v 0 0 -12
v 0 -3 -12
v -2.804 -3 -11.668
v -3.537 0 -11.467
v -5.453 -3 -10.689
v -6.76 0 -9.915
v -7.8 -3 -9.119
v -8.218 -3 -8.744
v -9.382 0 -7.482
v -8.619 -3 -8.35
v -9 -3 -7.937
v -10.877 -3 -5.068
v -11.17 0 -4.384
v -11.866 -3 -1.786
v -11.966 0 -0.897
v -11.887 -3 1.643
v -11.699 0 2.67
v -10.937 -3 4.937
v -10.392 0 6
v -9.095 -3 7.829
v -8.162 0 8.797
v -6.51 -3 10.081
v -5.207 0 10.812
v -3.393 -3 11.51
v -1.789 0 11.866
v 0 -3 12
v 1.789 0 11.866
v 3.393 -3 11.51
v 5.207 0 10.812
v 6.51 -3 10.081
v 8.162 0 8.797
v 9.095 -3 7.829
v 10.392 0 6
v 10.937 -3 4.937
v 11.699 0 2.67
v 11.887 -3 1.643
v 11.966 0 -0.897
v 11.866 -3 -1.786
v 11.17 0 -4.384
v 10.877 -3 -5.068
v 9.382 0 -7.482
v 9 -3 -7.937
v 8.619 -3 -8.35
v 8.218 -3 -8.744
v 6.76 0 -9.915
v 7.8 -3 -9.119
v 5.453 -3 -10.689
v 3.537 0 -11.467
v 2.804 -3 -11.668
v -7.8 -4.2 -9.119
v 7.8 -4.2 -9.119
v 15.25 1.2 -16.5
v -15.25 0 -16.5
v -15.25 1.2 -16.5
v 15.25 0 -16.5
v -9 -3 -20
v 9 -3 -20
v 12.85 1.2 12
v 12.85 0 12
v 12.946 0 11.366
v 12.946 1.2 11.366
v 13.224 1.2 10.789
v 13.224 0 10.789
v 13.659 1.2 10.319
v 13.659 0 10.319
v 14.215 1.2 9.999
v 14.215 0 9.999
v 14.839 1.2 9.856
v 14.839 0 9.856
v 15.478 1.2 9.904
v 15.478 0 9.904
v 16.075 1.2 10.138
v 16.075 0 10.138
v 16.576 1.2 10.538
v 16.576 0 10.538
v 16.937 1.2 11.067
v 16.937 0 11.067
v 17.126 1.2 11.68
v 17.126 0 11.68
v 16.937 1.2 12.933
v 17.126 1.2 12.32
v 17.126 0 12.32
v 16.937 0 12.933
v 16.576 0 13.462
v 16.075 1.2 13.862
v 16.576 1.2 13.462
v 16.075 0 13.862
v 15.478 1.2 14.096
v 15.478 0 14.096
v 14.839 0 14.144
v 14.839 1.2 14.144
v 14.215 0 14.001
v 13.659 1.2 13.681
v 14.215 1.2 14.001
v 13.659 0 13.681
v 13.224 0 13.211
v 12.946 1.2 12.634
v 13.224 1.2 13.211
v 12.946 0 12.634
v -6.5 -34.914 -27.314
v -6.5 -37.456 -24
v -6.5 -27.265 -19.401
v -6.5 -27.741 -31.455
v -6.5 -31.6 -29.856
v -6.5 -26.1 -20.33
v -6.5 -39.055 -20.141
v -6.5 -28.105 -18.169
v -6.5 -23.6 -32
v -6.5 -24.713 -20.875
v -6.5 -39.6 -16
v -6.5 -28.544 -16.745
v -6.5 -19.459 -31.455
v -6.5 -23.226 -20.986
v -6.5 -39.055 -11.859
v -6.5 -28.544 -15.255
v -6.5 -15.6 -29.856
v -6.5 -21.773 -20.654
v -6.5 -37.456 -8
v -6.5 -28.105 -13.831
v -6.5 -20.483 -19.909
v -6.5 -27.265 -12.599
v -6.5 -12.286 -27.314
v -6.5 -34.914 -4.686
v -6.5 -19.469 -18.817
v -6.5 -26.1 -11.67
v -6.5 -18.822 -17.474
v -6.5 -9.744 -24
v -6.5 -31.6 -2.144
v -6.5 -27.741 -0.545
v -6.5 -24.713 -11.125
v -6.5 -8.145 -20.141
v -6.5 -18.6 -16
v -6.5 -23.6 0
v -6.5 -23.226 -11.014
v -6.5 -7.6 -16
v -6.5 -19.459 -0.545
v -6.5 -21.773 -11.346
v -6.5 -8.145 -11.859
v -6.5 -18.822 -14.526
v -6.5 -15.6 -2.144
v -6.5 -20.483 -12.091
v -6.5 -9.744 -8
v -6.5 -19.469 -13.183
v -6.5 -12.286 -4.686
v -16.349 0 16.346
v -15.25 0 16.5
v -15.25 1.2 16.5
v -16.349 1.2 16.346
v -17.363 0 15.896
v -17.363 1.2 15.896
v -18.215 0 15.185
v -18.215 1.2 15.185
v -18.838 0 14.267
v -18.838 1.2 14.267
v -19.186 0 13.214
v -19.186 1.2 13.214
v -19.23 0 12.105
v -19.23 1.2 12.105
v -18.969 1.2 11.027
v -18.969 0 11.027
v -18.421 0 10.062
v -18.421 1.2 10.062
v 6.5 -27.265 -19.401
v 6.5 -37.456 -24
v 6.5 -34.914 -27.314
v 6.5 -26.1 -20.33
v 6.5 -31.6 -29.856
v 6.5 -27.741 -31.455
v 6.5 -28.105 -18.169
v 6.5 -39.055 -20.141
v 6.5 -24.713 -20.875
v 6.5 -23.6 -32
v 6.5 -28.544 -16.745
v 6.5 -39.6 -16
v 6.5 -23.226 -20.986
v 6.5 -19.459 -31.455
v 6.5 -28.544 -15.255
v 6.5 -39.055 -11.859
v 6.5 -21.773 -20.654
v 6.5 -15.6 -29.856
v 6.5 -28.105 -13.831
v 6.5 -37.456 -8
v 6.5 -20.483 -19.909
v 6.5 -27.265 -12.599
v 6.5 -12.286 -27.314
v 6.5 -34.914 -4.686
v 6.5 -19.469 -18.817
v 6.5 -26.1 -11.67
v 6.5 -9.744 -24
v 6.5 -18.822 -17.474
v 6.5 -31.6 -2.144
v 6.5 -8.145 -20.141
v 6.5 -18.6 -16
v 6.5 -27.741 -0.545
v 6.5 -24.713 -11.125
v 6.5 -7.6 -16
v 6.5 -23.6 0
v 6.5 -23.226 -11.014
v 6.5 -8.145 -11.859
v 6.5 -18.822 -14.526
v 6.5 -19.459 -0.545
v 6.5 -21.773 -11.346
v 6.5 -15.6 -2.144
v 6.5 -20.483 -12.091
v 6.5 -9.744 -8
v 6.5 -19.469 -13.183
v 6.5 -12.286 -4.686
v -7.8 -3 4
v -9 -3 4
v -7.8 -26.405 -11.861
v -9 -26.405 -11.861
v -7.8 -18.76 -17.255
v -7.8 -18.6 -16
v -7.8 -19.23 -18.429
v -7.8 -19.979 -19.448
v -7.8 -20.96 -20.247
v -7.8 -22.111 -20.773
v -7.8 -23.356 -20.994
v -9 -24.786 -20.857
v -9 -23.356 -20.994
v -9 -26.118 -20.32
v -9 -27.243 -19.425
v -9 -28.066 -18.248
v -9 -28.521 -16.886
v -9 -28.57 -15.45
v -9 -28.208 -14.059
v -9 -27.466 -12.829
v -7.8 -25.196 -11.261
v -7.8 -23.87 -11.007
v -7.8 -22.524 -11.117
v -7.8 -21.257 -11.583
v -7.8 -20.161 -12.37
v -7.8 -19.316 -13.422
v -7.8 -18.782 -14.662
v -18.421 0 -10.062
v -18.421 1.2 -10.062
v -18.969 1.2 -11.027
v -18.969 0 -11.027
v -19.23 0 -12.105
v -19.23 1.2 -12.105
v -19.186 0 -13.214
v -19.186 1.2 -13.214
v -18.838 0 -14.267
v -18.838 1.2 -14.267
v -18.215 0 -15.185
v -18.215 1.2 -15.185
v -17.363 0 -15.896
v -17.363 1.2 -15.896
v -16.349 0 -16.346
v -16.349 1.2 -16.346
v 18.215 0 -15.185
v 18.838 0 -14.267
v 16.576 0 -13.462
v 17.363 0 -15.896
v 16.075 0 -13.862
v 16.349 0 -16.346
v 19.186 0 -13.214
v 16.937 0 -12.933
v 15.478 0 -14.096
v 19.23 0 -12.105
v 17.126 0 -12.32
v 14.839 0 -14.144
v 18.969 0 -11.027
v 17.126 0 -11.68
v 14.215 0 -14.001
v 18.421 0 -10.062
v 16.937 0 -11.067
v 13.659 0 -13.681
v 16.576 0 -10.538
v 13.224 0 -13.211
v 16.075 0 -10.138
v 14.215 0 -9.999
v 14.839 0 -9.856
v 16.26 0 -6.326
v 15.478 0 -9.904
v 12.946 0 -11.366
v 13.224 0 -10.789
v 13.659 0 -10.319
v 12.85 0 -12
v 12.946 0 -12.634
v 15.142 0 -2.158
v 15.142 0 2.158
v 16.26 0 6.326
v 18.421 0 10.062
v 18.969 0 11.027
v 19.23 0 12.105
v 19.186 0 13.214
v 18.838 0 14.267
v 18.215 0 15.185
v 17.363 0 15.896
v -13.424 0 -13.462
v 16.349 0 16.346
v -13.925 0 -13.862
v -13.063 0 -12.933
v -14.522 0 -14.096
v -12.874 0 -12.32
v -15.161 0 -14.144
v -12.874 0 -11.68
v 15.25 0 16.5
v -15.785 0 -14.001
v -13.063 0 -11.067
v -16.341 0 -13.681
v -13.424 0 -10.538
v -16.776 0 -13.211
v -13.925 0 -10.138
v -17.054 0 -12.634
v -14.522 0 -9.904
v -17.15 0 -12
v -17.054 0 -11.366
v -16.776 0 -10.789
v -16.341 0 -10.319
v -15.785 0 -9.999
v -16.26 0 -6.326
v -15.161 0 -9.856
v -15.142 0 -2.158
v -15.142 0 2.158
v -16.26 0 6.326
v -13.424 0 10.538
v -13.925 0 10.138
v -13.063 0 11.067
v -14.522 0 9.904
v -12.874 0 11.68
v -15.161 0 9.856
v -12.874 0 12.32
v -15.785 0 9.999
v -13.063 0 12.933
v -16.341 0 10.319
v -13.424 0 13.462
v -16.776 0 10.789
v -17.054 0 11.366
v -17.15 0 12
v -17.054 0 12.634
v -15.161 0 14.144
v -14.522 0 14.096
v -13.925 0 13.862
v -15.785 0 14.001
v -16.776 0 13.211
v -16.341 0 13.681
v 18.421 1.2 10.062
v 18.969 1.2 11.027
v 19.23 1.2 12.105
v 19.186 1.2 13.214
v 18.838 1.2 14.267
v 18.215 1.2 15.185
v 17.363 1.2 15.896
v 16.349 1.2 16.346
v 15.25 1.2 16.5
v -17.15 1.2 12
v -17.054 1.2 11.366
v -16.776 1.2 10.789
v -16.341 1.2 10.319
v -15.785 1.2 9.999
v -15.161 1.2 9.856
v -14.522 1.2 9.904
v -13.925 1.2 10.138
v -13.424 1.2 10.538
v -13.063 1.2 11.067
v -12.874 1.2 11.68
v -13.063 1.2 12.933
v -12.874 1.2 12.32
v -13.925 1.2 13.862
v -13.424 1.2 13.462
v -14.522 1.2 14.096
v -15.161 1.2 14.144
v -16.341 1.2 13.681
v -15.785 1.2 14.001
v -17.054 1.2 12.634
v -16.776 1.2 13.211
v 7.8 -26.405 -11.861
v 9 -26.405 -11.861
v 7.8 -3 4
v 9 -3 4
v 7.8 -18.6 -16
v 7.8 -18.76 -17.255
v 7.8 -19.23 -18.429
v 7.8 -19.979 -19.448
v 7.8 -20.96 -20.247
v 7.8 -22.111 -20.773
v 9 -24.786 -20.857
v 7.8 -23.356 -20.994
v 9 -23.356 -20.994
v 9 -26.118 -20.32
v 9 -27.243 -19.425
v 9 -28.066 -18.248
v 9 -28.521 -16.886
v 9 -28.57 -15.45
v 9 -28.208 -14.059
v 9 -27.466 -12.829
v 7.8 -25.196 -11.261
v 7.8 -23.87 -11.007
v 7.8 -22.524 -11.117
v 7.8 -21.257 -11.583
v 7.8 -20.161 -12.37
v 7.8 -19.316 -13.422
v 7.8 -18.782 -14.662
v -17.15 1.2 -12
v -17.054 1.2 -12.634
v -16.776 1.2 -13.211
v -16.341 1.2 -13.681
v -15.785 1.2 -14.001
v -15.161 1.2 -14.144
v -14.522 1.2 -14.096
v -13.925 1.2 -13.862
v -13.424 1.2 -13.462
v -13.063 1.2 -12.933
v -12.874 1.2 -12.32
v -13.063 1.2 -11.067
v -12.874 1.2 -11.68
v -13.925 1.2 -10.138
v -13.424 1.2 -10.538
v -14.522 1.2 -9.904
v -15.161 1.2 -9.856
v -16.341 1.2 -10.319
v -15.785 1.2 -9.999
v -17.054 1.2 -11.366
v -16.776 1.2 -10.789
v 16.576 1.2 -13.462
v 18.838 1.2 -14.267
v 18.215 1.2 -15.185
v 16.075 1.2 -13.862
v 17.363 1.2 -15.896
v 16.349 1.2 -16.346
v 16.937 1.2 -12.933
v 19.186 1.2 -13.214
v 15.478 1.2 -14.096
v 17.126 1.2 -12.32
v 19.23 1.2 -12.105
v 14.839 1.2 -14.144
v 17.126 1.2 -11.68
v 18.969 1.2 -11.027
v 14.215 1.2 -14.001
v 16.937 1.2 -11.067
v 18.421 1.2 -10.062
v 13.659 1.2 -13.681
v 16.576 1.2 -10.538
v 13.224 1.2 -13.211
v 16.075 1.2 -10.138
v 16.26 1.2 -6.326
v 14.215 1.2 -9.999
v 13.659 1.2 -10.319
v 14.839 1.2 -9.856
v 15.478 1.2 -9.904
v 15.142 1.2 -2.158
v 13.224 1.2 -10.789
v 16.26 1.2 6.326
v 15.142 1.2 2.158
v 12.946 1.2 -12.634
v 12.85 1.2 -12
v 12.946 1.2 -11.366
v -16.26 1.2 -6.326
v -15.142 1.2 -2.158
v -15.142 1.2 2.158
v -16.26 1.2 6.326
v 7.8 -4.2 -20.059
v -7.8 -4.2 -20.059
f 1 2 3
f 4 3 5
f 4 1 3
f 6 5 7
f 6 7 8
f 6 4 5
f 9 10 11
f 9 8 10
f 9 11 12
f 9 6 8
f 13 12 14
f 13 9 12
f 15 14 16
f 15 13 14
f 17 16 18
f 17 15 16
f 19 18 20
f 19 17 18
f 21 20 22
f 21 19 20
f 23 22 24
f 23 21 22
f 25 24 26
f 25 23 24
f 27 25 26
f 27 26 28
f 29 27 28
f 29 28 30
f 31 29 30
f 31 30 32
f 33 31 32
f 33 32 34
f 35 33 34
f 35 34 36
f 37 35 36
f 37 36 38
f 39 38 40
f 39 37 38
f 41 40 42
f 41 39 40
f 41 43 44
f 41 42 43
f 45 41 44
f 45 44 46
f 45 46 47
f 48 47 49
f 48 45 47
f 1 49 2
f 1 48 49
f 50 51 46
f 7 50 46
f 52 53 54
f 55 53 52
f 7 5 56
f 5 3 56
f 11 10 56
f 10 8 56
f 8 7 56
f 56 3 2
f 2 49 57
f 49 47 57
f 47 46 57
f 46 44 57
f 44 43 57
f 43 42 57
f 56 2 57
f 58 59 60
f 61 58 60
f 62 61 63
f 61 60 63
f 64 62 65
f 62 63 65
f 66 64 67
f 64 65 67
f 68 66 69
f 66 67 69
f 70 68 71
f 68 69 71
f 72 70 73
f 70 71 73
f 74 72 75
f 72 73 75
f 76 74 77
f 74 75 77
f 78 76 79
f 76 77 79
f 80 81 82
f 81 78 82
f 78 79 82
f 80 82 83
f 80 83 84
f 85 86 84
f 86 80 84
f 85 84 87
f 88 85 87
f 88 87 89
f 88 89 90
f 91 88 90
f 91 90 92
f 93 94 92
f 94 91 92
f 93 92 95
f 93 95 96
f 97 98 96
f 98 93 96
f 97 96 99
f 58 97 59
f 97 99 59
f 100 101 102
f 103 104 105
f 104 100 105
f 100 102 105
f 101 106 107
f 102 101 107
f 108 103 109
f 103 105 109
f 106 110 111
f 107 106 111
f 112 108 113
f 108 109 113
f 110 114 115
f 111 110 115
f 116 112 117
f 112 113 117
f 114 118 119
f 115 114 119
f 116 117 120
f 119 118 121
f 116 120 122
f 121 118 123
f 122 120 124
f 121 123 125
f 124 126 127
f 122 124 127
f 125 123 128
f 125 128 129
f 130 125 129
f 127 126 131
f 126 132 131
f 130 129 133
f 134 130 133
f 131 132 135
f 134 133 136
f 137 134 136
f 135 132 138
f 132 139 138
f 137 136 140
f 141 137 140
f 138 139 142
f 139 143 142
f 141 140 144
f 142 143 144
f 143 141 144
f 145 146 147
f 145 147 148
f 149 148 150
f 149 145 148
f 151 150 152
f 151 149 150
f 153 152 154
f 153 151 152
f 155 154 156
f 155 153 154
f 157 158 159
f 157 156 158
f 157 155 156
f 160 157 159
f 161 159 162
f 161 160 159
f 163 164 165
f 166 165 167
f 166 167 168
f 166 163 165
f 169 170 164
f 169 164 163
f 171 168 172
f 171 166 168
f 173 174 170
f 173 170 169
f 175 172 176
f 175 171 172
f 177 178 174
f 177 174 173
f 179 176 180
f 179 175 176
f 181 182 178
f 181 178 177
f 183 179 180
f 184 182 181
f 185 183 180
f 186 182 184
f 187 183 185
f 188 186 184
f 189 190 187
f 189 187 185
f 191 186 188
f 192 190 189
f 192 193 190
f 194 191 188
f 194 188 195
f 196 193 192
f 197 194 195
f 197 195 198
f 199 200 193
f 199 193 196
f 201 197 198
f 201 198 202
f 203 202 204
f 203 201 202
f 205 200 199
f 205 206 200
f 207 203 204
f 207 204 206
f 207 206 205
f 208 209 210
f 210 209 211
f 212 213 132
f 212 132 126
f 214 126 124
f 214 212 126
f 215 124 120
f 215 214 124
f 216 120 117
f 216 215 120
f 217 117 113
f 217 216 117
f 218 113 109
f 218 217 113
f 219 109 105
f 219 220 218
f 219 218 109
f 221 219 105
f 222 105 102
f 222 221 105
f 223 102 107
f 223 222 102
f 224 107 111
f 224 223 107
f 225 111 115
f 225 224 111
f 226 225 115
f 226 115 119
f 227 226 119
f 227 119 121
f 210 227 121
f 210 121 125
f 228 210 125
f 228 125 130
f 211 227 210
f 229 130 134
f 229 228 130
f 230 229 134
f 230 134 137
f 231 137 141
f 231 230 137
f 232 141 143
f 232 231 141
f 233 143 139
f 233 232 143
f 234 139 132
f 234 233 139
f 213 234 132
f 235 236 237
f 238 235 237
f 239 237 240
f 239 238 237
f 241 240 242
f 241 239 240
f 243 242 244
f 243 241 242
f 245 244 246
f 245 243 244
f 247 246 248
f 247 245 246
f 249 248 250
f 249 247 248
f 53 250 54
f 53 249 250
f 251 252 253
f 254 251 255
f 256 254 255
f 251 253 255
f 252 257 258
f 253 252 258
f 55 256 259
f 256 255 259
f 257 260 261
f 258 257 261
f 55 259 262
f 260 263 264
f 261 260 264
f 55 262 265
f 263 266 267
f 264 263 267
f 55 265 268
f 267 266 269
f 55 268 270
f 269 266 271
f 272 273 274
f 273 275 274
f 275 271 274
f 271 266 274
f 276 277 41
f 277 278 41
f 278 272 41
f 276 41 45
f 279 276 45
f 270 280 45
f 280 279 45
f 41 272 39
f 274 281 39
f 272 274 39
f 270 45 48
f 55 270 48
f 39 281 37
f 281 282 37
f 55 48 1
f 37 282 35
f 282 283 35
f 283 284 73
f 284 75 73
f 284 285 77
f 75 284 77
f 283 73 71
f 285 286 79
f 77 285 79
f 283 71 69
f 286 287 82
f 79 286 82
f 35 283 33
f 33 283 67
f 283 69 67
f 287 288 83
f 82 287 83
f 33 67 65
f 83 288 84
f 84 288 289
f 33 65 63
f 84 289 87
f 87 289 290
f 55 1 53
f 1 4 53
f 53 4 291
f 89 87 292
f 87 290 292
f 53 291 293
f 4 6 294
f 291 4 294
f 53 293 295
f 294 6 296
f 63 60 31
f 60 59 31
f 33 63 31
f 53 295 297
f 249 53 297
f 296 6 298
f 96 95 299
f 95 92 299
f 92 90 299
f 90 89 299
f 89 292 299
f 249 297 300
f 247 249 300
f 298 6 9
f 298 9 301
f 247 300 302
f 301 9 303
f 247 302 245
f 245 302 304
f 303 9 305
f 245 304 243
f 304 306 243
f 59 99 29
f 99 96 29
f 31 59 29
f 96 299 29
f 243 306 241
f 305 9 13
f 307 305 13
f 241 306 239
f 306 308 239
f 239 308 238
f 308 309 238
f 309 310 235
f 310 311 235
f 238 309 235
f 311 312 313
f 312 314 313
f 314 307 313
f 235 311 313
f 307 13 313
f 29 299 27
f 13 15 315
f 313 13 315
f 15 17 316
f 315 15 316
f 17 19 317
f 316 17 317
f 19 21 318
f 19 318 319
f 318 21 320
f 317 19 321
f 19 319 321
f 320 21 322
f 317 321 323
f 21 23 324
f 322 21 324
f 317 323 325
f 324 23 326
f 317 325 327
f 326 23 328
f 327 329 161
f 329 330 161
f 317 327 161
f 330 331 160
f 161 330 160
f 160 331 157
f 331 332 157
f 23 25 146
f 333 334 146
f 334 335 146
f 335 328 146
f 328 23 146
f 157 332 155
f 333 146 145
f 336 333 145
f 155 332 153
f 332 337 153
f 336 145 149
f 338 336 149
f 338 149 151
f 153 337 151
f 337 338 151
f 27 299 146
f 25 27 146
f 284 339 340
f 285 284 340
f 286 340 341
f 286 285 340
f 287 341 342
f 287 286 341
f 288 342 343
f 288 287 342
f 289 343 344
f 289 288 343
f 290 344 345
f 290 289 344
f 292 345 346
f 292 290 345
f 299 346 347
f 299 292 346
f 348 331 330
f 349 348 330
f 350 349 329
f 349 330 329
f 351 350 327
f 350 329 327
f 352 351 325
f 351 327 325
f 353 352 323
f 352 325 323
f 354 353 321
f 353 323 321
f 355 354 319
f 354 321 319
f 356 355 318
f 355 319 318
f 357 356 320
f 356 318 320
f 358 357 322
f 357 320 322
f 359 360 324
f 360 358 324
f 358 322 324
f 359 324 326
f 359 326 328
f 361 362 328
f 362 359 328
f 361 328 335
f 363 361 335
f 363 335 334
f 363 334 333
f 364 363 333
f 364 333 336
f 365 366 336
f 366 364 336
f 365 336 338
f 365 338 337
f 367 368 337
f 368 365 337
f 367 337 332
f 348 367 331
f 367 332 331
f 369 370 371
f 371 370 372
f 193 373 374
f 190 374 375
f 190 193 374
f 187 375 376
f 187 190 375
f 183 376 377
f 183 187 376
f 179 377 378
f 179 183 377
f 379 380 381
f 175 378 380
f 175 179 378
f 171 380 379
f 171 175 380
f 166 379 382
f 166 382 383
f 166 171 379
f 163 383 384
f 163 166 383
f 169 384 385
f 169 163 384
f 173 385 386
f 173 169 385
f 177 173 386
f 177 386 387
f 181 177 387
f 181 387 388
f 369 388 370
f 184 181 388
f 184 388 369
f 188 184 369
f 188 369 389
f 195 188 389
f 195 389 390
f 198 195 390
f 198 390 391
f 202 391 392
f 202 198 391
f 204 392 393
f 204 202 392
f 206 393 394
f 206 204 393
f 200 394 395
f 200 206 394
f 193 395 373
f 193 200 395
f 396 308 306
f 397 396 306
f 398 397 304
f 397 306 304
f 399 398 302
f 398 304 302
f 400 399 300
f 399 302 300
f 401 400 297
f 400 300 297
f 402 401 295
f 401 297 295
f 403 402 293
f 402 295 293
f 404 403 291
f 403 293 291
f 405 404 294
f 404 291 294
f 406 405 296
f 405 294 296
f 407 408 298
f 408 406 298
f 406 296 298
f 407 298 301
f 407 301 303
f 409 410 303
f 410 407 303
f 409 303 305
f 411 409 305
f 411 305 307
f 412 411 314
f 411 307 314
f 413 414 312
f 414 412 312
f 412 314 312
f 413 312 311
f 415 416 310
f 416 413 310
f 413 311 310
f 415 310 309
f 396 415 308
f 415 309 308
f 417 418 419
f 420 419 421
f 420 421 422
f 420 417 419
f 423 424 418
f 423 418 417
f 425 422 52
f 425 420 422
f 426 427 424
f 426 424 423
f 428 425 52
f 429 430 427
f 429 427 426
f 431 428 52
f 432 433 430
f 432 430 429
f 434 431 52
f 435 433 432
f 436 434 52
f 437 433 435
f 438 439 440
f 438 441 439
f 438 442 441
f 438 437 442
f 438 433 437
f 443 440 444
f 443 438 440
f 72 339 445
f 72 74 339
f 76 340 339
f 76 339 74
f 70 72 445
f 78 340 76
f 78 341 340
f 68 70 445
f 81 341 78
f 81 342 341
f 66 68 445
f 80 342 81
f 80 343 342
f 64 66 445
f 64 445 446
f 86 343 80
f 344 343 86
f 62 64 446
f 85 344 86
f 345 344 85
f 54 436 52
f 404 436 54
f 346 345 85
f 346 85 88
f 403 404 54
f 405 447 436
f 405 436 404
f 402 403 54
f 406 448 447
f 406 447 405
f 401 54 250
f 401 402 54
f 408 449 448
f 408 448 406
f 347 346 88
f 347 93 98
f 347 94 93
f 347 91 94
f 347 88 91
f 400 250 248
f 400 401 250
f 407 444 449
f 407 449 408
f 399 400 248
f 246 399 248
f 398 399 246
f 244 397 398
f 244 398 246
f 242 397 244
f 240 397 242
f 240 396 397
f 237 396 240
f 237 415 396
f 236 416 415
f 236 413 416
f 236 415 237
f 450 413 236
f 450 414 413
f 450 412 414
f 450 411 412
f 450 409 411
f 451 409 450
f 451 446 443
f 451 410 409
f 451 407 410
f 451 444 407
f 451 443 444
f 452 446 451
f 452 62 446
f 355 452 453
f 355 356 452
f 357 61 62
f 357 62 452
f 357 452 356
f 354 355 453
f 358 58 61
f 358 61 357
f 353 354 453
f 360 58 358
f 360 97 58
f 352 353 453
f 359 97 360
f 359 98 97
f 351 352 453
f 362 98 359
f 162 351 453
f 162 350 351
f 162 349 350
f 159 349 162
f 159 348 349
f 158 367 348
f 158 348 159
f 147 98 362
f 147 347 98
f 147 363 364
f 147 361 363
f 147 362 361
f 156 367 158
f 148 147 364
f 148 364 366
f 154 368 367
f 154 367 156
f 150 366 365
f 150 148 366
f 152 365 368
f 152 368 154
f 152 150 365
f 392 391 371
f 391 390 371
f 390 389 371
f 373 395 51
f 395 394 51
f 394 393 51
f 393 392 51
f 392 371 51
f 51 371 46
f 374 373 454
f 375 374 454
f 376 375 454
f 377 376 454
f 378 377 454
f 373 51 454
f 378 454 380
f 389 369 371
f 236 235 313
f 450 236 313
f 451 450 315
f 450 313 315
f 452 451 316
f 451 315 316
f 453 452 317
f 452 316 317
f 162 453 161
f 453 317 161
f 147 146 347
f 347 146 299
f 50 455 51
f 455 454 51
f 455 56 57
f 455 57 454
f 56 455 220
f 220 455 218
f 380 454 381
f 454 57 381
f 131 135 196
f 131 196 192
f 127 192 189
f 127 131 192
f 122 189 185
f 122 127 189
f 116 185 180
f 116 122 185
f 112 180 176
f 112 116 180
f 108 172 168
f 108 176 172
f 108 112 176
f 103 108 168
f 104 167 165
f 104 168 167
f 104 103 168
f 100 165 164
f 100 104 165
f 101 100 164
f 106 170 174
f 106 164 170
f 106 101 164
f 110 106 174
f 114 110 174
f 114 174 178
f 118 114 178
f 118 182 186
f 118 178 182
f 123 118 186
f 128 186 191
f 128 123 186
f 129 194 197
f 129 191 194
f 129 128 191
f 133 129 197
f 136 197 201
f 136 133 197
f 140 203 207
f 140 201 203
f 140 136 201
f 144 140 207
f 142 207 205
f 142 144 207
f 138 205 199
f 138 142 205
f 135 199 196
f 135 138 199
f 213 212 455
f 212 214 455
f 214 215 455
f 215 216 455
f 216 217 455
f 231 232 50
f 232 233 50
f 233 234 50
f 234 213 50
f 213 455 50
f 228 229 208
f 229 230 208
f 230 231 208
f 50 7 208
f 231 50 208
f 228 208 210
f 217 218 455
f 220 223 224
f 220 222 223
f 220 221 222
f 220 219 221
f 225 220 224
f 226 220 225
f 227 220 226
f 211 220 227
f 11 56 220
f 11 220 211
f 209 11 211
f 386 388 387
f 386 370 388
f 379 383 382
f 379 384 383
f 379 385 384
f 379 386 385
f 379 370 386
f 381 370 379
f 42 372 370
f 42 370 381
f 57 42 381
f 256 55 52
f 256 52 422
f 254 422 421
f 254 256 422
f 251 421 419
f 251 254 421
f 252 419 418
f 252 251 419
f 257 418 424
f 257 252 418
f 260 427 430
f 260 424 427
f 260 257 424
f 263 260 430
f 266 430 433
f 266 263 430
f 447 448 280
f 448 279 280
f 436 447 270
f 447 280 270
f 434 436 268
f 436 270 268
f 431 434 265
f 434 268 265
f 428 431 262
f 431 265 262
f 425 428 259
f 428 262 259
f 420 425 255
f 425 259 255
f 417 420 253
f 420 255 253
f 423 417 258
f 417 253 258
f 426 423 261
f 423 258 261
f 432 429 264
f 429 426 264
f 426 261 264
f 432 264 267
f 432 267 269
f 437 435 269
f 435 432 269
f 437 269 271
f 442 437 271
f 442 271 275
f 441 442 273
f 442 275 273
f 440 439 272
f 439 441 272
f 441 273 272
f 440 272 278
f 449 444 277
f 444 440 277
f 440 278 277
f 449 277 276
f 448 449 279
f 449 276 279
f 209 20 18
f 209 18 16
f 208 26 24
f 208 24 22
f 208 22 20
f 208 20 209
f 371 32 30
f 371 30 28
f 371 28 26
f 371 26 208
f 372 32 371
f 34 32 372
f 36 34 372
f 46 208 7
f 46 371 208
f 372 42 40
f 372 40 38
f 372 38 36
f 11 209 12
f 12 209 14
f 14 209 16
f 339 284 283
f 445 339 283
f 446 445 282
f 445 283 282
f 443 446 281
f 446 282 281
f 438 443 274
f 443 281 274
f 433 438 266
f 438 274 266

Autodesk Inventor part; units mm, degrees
ref_plane "YZ Plane" through (0, 0, 0) normal (1, 0, 0) x (0, 1, 0)
ref_plane "XZ Plane" through (0, 0, 0) normal (0, 1, 0) x (-1, 0, 0)
ref_plane "XY Plane" through (0, 0, 0) normal (0, 0, 1) x (1, 0, 0)
sketch "Skizze1" plane through (0, 0, 0) normal (0, 1, 0) x (-1, 0, 0)
  line L0 (15.25, -16.5) -> (-15.25, -16.5)
  line L1 (15.25, 16.5) -> (-15.25, 16.5)
  arc A0 (-18.421, -10.0619) -> (-18.421, 10.0619) centre (-31.5074, 0) ccw
  arc A1 (18.421, 10.0619) -> (18.421, -10.0619) centre (31.5074, 0) ccw
  arc A2 (15.25, -16.5) -> (18.421, -10.0619) centre (15.25, -12.5) ccw
  arc A3 (18.421, 10.0619) -> (15.25, 16.5) centre (15.25, 12.5) ccw
  arc A4 (-15.25, 16.5) -> (-18.421, 10.0619) centre (-15.25, 12.5) ccw
  arc A5 (-18.421, -10.0619) -> (-15.25, -16.5) centre (-15.25, -12.5) ccw
  circle A6 centre (15, -12) radius 2.15
  circle A7 centre (-15, -12) radius 2.15
  circle A8 centre (-15, 12) radius 2.15
  circle A9 centre (15, 12) radius 2.15
  line L2 (15, 12) -> (15, -12) construction
  line L3 (15, -12) -> (-15, -12) construction
  line L4 (-15, -12) -> (-15, 12) construction
  line L5 (-15, 12) -> (15, 12) construction
  line L6 (0, -24.4811) -> (0, 24.4811) projected
  line L7 (44.8, 0) -> (-44.8, 0) projected
  line L8 (15, 0) -> (-15, 0) construction
  point P0 (0, 0)
  point P1 (32, -16.5)
  point P2 (-32, -16.5)
  point P3 (32, 16.5)
  point P4 (-32, 16.5)
  dimension "d0" = 4
  dimension "d1" = 30
  dimension "d2" = 24
  dimension "d3" = 33
  dimension "d4" = 4.3
  dimension "d5" = 38.5
extrude "Extrusion1" add sketch "Skizze1" along normal blind 1.2
sketch "Skizze2" plane through (0, 0, 0) normal (1, 0, 0) x (0, 1, 0)
  line L0 (0, 10.0619) -> (0, -10.0619) projected
  line L1 (0, 12) -> (-3, 12)
  line L2 (-3, 12) -> (-3, -12)
  line L3 (-3, -12) -> (0, -12)
  line L4 (-1.683, 0) -> (1.6805, 0) projected
  circle A0 centre (-23.6, -16) radius 16
  line L5 (1.2, 10.0619) -> (1.2, -10.0619) projected
  line L6 (0, -16.5) -> (1.2, -16.5) projected
  circle A1 centre (-23.6, -16) radius 5
  line L7 (-3, -12) -> (-3, -20)
  line L8 (-3, -20) -> (-23.3561, -20.994)
  line L9 (-3, 4) -> (-26.405, -11.8609)
  line L10 (0, 0) -> (-3, 0)
  line L11 (0, 10.0619) -> (0, -10.0619) projected
  line L12 (0, 0) -> (0, -12)
  dimension "d8" = 3
  dimension "d9" = 32
  dimension "d10" = 40.8
  dimension "d12" = 0
  dimension "d13" = 10
  dimension "d14" = 8
  dimension "d16" = 8
  dimension "d18" = 24
revolve "Umdrehung1" add sketch "Skizze2" angle 360 about axis through (0, 0, 0) along (0, -1, 0) contours L0 L12 L3 L2 L10 L4
extrude "Extrusion2" add sketch "Skizze2" along normal mid plane 13 contours L9 A1 L8 A0 | A0 L8 A1 L9
extrude "Extrusion3" add sketch "Skizze2" along normal mid plane 18 contours A1
sketch "Skizze3" plane through (-9, -23.6, -16) normal (-1, 0, 0) x (0, 0, 1)
  line L0 (-4, 20.6) -> (-4.994, 0.2439) projected
  line L1 (4, 20.6) -> (-4, 20.6) projected
  line L2 (20, 20.6) -> (4.1391, -2.805) projected
  circle A0 centre (0, 0) radius 5 projected
  line L3 (-4, 20.6) -> (20, 20.6)
  line L4 (4, 20.6) -> (28, 20.6) projected
  line L5 (20, 20.6) -> (4.1391, -2.805)
  circle A1 centre (0, 0) radius 5 projected
  arc A2 (4.1391, -2.805) -> (-4.994, 0.2439) centre (0, 0) ccw
  line L6 (-4.994, 0.2439) -> (-4, 20.6)
  point P0 (16, 23.6)
extrude "Extrusion4" add sketch "Skizze3" against normal blind 1.2 contours L1 L3 L2 A0 L0
mirror "Spiegeln1" about plane through (0, 0, 0) normal (1, 0, 0) of "Extrusion4"
sketch "Skizze4" plane through (7.8, -3, -9.1192) normal (-1, 0, 0) x (0, 0, 1)
  line L0 (-10.8808, 0) -> (-11.8748, -20.3561) projected
  line L1 (-10.9394, -1.2) -> (0, -1.2)
  line L2 (0, 0) -> (1.182, 0) projected
  line L3 (0, -1.2) -> (0, 0)
  line L4 (1.182, 0) -> (-10.8808, 0) projected
  point P0 (9.1192, 3)
  dimension "d27" = 1.2
extrude "Extrusion5" add sketch "Skizze4" along normal up to surface (15.6 mm away)
properties part number "Castor_Wheel" material "Stahl, unlegiert"
